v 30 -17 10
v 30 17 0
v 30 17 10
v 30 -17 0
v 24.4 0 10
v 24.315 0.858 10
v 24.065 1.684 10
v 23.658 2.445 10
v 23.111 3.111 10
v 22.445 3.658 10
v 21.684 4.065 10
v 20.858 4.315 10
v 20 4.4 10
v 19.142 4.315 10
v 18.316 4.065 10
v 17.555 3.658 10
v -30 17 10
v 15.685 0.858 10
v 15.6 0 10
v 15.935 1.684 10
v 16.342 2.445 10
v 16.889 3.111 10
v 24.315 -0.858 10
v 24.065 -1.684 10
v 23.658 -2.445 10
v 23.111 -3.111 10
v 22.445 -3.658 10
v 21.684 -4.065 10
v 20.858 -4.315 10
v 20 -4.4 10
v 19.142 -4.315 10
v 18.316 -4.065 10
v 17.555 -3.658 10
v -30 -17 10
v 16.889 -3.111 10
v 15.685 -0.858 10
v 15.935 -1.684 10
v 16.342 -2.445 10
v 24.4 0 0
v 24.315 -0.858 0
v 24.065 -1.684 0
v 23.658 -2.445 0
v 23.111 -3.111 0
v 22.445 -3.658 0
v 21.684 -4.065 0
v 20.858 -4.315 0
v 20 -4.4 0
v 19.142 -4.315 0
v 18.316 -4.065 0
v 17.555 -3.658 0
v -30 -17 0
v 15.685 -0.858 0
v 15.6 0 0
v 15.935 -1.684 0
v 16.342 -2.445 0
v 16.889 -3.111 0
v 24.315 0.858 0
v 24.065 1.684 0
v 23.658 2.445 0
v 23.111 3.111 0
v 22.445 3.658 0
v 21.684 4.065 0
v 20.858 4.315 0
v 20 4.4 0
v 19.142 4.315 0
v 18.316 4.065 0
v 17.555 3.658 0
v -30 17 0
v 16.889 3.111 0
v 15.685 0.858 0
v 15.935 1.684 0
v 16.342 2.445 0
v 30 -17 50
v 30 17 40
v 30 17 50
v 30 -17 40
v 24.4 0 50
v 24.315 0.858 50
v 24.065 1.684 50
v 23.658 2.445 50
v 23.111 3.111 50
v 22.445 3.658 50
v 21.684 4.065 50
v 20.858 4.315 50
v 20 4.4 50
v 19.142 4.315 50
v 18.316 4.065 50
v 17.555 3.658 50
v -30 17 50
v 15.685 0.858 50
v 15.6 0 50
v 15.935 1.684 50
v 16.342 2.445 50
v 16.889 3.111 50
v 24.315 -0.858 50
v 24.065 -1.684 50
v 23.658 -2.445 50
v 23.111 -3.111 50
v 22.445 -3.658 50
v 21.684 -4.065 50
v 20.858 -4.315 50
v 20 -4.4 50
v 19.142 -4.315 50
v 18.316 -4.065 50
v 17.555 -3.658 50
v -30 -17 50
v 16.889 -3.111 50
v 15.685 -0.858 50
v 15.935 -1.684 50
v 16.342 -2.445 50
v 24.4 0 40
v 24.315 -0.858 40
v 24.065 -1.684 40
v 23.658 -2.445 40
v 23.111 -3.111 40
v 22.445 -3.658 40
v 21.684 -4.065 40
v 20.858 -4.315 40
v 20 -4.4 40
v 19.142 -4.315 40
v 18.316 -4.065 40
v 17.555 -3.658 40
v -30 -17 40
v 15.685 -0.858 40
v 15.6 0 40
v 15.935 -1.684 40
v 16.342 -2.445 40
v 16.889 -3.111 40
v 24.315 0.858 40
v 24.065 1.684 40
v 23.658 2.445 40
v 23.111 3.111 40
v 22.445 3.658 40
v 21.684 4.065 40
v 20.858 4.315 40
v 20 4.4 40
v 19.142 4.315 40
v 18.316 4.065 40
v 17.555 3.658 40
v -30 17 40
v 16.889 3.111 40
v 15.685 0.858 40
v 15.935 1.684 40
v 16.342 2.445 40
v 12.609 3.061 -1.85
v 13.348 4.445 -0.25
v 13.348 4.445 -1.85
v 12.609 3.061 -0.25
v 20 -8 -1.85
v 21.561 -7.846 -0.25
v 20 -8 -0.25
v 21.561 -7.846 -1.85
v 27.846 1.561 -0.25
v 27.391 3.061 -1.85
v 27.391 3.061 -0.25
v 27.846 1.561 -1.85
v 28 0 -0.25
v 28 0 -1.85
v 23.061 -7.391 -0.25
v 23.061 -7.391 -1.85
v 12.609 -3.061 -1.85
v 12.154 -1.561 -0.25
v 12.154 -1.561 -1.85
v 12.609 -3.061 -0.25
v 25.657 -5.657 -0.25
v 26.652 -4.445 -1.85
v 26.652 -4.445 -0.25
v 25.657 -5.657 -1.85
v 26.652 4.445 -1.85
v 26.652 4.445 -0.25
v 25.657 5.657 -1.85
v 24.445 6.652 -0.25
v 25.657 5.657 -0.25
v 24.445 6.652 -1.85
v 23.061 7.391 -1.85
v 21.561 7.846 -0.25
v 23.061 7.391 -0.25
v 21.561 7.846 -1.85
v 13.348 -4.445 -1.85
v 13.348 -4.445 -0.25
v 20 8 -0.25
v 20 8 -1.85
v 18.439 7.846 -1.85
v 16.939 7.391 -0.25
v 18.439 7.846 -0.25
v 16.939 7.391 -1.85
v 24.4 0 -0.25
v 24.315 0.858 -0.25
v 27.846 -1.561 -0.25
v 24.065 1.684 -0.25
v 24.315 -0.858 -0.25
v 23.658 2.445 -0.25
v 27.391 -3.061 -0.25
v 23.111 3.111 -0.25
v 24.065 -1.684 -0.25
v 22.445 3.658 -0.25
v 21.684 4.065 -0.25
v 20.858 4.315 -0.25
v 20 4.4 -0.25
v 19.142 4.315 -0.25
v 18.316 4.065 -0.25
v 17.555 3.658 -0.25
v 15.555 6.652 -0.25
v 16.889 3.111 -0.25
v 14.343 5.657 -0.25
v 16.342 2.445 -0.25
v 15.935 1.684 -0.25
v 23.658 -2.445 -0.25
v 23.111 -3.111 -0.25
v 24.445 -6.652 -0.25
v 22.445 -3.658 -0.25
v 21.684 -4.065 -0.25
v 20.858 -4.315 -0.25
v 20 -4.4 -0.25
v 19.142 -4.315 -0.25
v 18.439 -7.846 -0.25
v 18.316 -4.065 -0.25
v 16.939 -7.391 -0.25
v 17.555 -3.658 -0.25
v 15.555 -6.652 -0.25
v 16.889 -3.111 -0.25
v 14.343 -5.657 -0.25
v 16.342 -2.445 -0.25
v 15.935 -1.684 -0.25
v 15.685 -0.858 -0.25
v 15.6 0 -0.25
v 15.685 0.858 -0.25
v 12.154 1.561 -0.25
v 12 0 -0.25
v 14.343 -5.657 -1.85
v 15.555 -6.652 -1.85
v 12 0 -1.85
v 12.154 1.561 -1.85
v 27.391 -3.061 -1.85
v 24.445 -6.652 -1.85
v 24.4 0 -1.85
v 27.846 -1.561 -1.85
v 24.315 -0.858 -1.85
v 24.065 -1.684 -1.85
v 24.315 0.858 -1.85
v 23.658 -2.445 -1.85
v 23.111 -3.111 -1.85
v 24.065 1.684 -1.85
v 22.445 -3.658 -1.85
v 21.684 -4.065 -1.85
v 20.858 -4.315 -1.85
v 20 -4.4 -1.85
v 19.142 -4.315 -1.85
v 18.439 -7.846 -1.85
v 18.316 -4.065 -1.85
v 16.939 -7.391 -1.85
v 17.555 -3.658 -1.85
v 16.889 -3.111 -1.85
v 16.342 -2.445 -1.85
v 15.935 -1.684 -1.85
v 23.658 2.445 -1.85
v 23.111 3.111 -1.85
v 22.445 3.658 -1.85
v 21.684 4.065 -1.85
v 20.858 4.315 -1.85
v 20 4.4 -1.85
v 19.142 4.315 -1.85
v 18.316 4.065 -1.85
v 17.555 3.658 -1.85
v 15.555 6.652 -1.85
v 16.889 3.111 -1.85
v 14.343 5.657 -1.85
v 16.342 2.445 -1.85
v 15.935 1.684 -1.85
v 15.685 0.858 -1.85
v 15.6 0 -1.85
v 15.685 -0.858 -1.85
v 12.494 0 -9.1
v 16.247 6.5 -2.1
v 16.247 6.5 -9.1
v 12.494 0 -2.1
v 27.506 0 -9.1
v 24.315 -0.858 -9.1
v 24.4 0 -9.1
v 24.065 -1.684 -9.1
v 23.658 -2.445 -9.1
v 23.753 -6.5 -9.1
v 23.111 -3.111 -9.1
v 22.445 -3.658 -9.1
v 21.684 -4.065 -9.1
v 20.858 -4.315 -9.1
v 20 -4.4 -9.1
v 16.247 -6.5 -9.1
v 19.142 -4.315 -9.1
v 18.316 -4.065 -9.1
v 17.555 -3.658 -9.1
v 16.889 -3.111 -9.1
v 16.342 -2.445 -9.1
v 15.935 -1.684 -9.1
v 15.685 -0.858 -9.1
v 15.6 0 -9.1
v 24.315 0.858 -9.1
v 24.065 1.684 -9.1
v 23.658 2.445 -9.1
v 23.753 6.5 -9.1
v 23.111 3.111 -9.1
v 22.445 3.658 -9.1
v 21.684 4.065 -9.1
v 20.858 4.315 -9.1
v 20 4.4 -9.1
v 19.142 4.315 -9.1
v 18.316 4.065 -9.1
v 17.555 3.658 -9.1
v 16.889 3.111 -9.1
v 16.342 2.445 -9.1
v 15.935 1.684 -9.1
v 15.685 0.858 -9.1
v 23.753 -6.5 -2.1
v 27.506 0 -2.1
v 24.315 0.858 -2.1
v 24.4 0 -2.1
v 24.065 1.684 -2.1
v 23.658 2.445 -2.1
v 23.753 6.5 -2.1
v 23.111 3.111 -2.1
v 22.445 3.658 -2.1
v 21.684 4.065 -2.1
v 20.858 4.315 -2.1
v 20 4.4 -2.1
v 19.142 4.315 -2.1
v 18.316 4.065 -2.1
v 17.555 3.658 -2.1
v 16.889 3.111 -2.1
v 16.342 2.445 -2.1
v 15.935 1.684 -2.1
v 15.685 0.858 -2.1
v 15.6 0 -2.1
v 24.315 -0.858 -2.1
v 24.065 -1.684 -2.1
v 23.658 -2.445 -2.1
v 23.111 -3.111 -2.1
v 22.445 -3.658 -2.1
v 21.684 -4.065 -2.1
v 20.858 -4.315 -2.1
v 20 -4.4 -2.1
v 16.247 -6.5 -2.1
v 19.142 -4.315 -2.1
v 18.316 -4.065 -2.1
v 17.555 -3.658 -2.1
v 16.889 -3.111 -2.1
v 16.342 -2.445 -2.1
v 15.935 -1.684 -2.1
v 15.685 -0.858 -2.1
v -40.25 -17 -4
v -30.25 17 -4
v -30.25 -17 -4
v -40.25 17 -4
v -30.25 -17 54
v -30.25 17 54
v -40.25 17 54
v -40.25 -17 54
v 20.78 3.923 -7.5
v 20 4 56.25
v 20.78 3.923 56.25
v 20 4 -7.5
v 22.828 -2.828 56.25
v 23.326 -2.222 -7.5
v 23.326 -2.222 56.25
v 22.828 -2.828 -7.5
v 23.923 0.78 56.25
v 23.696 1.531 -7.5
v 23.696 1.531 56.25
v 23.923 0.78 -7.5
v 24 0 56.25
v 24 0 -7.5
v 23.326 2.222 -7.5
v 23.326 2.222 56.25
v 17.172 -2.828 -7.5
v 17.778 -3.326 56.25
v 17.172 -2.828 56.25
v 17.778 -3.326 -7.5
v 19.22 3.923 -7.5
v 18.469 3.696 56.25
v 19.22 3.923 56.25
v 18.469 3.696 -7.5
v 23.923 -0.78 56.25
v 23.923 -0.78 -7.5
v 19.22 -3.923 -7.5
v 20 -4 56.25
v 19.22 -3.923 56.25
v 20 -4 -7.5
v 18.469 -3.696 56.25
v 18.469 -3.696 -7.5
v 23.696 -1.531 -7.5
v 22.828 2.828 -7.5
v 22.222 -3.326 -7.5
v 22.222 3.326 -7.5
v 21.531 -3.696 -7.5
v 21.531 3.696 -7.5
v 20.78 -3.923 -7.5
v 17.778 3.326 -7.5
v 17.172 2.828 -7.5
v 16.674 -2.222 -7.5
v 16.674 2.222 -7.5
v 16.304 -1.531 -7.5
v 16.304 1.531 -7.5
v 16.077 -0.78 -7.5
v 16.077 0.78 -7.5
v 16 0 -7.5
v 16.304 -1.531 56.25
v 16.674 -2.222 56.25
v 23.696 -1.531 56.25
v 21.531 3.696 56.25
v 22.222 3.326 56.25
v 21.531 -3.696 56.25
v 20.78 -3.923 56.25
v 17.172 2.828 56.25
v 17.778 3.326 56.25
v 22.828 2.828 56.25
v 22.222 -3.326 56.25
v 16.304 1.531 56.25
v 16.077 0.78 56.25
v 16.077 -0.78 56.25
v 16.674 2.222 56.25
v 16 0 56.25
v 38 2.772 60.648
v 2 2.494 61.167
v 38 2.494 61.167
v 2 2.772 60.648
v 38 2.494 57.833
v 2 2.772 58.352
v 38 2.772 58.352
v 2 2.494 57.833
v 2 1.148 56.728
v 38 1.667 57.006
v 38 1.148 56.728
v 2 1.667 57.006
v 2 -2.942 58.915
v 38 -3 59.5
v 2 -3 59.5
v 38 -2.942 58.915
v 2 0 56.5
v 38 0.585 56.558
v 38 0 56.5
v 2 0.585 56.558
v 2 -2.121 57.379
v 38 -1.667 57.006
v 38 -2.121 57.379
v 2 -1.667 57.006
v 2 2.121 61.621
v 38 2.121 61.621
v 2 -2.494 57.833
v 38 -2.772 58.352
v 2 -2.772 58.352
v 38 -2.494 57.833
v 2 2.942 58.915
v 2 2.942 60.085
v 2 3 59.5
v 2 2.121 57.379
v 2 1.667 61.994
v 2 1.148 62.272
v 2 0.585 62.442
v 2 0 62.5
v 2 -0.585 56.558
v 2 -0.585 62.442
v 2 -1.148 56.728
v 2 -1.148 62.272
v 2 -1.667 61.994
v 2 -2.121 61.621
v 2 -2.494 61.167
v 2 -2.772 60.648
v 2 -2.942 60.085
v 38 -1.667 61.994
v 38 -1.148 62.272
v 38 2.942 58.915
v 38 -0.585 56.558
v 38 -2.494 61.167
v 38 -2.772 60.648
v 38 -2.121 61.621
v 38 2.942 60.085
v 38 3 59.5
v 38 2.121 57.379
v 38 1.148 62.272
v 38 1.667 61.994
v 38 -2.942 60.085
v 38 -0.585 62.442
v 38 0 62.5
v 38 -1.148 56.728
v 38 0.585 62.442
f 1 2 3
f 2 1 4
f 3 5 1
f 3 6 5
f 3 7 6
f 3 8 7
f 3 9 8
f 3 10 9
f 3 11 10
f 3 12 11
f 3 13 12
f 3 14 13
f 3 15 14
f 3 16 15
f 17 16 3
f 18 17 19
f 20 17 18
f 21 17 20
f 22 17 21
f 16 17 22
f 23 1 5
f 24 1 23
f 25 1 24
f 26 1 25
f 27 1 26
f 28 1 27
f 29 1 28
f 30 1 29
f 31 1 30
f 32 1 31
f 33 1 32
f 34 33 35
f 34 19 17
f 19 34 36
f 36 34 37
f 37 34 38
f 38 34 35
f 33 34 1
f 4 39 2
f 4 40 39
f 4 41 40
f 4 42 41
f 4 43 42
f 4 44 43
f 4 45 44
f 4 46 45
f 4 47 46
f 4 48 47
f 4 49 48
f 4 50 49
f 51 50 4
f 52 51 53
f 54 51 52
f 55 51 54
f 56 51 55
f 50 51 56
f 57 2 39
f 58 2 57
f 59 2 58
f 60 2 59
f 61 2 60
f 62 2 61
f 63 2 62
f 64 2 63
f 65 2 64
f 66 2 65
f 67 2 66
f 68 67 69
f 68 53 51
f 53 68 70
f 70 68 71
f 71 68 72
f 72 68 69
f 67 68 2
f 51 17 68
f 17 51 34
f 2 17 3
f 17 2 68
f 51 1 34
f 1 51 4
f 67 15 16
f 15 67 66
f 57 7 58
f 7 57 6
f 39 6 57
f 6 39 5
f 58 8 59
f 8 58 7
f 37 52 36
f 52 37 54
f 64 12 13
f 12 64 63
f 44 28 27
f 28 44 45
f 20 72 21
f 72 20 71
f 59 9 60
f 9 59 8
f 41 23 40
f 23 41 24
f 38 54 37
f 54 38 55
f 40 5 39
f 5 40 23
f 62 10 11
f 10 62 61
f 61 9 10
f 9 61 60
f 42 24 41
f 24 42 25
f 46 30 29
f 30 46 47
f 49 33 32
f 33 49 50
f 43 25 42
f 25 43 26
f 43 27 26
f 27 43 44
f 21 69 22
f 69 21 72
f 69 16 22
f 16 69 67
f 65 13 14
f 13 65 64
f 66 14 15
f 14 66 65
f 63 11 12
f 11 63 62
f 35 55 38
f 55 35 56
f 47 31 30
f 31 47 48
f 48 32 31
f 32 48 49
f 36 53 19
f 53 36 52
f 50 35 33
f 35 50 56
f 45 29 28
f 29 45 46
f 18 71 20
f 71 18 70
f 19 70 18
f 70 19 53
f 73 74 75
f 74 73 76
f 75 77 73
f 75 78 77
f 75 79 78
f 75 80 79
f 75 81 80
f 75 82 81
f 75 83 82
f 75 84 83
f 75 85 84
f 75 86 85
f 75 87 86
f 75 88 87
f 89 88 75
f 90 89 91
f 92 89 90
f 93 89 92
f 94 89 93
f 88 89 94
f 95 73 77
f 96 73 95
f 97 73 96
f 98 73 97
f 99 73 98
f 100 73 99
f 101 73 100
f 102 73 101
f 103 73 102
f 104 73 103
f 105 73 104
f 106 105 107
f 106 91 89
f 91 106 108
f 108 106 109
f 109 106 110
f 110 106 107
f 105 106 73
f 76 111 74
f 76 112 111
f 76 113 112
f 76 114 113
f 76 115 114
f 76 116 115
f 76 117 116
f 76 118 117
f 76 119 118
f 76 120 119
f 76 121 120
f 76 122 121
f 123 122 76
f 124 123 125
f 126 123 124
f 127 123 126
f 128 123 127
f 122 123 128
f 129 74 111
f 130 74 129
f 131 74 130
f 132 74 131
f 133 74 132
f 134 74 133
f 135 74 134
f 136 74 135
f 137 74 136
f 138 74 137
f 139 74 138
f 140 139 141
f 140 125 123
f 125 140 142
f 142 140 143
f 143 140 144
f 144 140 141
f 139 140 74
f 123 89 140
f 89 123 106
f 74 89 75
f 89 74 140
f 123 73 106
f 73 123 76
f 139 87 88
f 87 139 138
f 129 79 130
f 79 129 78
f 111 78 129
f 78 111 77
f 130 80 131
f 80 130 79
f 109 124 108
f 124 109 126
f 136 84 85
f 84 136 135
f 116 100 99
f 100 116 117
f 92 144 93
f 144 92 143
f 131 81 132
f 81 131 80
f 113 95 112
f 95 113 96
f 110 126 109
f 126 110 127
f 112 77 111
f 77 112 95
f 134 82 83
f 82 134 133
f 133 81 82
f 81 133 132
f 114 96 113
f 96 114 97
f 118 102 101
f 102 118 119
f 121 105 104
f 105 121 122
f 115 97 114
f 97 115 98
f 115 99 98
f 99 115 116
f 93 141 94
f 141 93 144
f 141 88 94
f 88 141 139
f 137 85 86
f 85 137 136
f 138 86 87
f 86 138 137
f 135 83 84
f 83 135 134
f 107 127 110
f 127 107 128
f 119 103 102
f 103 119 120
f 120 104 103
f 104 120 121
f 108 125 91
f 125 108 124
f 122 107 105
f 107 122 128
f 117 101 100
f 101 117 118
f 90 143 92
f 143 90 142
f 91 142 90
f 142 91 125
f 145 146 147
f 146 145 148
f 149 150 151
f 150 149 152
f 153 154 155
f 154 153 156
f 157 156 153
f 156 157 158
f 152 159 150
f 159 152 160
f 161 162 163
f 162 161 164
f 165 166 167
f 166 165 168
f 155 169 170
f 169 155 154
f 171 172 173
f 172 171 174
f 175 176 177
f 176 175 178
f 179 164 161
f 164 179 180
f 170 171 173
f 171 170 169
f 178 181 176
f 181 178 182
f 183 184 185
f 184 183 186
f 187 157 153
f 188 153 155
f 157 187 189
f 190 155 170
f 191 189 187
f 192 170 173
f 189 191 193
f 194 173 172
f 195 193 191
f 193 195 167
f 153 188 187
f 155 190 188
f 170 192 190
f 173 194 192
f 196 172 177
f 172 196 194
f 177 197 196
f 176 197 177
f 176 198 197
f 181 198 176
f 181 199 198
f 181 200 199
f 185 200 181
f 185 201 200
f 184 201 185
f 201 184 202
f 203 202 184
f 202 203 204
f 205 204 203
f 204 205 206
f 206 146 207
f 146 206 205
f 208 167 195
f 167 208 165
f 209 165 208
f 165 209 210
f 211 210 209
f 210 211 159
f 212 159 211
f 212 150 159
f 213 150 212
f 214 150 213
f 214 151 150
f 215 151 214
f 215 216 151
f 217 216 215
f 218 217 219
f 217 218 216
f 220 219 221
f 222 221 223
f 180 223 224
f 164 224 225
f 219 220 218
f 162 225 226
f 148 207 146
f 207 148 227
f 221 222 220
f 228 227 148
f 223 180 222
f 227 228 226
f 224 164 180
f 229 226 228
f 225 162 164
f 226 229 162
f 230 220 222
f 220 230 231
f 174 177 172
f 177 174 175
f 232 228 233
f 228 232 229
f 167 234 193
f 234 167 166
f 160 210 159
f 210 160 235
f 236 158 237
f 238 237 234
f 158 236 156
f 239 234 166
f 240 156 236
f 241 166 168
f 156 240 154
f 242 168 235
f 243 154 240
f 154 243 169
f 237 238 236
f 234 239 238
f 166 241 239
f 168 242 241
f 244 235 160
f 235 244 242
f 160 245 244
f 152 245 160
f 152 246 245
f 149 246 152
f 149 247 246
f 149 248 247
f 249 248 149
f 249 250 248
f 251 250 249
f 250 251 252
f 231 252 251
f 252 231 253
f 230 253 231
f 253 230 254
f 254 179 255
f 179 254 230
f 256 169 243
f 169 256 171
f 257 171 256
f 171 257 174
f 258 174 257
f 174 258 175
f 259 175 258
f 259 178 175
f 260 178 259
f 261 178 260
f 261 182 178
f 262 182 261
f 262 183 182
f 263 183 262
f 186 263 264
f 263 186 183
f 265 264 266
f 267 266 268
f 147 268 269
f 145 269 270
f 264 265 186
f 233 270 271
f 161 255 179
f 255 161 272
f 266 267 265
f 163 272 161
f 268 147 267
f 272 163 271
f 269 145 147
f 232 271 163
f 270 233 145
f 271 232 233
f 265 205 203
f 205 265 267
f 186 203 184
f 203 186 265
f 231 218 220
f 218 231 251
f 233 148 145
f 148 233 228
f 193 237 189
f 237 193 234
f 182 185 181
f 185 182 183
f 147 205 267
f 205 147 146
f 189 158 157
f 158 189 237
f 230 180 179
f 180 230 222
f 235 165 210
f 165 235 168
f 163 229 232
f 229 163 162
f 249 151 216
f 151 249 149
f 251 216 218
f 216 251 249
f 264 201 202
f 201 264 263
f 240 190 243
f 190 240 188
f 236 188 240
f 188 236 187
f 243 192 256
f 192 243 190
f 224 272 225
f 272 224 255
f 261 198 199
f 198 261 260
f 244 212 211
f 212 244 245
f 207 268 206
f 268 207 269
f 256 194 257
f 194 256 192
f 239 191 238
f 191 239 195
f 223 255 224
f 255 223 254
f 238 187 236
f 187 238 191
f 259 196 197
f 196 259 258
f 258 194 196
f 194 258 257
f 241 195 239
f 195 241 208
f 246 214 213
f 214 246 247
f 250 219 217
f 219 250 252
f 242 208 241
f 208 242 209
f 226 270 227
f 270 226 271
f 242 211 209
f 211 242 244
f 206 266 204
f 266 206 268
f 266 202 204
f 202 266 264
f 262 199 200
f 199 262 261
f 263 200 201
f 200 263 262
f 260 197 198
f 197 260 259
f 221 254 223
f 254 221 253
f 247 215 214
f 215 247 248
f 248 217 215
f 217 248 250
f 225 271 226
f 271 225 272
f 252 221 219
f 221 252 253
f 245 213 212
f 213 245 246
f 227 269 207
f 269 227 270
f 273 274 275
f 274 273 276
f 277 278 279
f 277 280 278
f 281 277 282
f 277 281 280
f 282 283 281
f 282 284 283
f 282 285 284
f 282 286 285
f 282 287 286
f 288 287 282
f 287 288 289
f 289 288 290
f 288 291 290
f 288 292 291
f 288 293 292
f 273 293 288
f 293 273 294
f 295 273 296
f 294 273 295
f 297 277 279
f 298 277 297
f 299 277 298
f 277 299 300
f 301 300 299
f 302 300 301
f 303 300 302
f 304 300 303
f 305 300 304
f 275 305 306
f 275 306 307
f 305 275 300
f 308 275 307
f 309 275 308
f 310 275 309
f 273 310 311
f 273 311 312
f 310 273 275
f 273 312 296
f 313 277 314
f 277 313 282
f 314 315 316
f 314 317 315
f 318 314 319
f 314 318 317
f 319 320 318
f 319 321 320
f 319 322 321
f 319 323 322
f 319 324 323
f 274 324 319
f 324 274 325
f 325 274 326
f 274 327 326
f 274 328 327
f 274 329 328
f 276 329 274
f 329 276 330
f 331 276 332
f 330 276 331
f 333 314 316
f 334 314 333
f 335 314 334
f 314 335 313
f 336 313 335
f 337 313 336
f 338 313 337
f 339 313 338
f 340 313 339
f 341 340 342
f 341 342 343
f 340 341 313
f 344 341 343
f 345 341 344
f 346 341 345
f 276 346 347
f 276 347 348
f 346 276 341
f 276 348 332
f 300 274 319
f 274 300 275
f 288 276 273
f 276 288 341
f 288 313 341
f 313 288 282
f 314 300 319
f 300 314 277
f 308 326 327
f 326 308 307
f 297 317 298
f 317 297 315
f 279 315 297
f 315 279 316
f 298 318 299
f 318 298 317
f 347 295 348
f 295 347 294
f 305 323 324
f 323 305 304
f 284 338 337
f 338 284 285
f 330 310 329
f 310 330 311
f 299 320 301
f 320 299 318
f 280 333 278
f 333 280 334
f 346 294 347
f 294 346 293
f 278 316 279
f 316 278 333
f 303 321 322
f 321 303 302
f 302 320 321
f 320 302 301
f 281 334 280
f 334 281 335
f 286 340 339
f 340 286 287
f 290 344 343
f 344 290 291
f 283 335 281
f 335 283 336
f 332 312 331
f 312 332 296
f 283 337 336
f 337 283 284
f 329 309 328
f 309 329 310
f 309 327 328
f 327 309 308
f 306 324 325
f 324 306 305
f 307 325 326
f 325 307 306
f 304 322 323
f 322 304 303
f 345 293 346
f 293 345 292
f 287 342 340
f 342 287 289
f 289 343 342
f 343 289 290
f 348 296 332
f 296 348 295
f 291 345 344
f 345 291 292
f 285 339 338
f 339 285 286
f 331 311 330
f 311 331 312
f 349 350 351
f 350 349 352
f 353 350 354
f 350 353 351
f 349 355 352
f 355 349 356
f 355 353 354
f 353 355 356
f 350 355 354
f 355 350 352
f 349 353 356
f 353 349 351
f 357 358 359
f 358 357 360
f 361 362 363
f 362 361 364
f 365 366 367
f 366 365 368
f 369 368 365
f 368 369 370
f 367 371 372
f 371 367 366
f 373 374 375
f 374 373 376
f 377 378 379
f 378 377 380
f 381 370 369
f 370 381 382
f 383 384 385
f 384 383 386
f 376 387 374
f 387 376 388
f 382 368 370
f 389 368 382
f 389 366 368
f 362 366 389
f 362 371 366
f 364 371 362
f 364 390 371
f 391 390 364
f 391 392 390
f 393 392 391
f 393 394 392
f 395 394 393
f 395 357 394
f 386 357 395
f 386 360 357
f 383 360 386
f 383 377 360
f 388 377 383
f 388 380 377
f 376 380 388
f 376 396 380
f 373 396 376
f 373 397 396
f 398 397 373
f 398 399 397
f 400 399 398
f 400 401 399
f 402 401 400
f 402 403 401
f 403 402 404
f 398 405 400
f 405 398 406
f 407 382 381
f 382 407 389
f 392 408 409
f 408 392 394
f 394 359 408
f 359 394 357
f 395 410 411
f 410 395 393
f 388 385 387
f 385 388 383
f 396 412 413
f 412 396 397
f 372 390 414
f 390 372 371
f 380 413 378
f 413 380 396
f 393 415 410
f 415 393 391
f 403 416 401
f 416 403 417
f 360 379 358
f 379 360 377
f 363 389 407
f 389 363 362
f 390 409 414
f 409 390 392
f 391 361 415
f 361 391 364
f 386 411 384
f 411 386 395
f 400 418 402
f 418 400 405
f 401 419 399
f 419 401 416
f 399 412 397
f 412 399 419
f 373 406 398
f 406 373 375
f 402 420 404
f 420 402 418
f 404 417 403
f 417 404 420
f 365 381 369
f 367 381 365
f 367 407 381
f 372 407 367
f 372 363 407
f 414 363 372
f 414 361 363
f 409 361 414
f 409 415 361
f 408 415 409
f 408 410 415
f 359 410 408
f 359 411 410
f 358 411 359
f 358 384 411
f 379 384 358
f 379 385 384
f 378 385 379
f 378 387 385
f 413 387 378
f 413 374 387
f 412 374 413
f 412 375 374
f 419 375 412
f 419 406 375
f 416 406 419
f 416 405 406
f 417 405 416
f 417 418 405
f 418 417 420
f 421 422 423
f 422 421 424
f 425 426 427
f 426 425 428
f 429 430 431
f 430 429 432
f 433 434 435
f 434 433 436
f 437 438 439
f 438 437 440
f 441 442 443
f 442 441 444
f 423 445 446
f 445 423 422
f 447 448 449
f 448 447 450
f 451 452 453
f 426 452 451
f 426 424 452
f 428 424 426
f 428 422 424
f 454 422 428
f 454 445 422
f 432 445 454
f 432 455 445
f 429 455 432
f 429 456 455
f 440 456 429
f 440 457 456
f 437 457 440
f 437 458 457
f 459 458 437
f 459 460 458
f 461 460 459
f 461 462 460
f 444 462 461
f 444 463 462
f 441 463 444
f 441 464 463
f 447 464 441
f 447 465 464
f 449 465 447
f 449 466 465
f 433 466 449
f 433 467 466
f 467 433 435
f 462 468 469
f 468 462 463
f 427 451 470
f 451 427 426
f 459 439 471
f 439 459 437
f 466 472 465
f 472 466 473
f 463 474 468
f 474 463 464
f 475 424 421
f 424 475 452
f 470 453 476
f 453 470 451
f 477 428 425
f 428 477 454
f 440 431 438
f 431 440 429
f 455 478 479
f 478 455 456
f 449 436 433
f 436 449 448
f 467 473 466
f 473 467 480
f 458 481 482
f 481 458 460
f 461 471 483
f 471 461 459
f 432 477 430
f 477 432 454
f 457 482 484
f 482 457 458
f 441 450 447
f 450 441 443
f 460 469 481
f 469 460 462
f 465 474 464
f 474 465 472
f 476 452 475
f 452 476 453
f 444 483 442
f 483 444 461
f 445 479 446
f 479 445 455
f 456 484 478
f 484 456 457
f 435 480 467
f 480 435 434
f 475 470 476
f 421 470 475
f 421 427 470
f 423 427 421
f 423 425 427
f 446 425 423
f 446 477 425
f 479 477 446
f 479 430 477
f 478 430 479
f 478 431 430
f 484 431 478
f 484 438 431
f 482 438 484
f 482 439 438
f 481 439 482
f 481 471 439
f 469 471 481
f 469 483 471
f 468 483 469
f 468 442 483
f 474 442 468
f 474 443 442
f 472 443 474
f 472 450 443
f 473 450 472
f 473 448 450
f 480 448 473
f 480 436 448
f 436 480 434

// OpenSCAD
$fn = 32;

// ------------------------------------------------------------------------
// C clamp: throat 40 mm, screw d8
// Every part is its own module, assembly() places every instance.
// ------------------------------------------------------------------------

// --- part 1 ---
module clamp_arm() {
  difference() {
    translate([-30, -17, 0]) cube([60, 34, 10]);
    translate([20, 0, -1]) cylinder(h = 12, d = 8.8);
  }
}

// --- part 2 ---
module clamp_spine() {
  difference() {
    translate([-29, -17, 0]) cube([58, 34, 10]);
  }
}

// --- part 3 ---
module clamp_screw() {
  translate([0, 0, -31.875]) cylinder(h = 63.75, d = 8);
}

// --- part 4 ---
module clamp_washer() {
  difference() {
      translate([0, 0, 0]) cylinder(h = 1.6, d = 16);
      translate([0, 0, -1]) cylinder(h = 3.6, d = 8.8);
    }
}

// --- part 5 ---
module clamp_nut() {
  difference() {
    linear_extrude(height = 7) polygon(points = [[7.506, 0], [3.753, 6.5], [-3.753, 6.5], [-7.506, 0], [-3.753, -6.5], [3.753, -6.5]]);
    translate([0, 0, -1]) cylinder(h = 9, d = 8.8);
  }
}

// --- part 6 ---
module tommy_bar() {
  translate([0, 0, -18]) cylinder(h = 36, d = 6);
}

// --- assembly ---
module assembly() {
  color([0.80, 0.24, 0.20]) translate([0, 0, 0]) rotate([0, 0, 0]) clamp_arm();
  color([0.20, 0.45, 0.75]) translate([0, 0, 40]) rotate([0, 0, 0]) clamp_arm();
  color([0.25, 0.62, 0.32]) translate([-40.25, 0, 25]) rotate([0, 90, 0]) clamp_spine();
  color([0.92, 0.70, 0.18]) translate([20, 0, 24.375]) rotate([0, 0, 0]) clamp_screw();
  color([0.58, 0.35, 0.70]) translate([20, 0, -1.85]) rotate([0, 0, 0]) clamp_washer();
  color([0.16, 0.66, 0.66]) translate([20, 0, -9.1]) rotate([0, 0, 0]) clamp_nut();
  color([0.85, 0.48, 0.18]) translate([20, 0, 59.5]) rotate([0, 90, 0]) tommy_bar();
}

assembly();
